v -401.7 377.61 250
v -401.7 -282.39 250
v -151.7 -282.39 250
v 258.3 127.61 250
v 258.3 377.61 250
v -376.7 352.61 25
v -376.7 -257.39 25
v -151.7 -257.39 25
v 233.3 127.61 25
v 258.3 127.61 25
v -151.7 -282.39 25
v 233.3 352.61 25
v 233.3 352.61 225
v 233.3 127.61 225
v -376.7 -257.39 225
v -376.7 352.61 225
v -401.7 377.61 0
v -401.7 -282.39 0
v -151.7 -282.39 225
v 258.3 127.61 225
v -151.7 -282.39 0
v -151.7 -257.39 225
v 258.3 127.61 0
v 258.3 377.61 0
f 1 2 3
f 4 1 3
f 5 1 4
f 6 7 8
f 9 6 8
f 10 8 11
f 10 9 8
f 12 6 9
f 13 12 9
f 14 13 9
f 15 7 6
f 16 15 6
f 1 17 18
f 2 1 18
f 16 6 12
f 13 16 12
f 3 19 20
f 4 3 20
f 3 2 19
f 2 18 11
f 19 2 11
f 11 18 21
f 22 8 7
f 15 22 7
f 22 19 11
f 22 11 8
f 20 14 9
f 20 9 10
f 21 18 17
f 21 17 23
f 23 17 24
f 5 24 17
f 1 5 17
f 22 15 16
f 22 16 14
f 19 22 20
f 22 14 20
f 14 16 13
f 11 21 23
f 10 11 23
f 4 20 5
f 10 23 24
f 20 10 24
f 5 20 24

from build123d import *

# Parameters (mm, degrees)
F1_DEPTH = 25
F3_DEPTH = 200
F5_DEPTH = 25


with BuildPart() as f1:
    # F0 (on Top) → F1 (new body)
    with BuildSketch(Plane.XY):
        Polygon((-401.6996773316, 377.6099345749), (-401.6996773316, -282.3900654251), (-151.6996773316, -282.3900654251), (258.3003226684, 127.6099345749), (258.3003226684, 377.6099345749), align=None)
    extrude(amount=F1_DEPTH)

    # F2 (on face) → F3 (join)
    with BuildSketch(Plane.XY.offset(25)):
        Polygon((-376.6996773316, -257.3900654251), (-376.6996773316, 352.6099345749), (233.3003226684, 352.6099345749), (233.3003226684, 127.6099345749), (258.3003226684, 127.6099345749), (258.3003226684, 377.6099345749), (-401.6996773316, 377.6099345749), (-401.6996773316, -282.3900654251), (-151.6996773316, -282.3900654251), (-151.6996773316, -257.3900654251), align=None)
    extrude(amount=F3_DEPTH)

    # F4 (on face) → F5 (join)
    with BuildSketch(Plane.XY.offset(225)):
        Polygon((-401.6996773316, -282.3900654251), (-151.6996773316, -282.3900654251), (-151.6996773316, -257.3900654251), (-376.6996773316, -257.3900654251), (-376.6996773316, 352.6099345749), (233.3003226684, 352.6099345749), (233.3003226684, 127.6099345749), (258.3003226684, 127.6099345749), (258.3003226684, 377.6099345749), (-401.6996773316, 377.6099345749), align=None)
        Polygon((-151.6996773316, -257.3900654251), (-151.6996773316, -282.3900654251), (258.3003226684, 127.6099345749), (233.3003226684, 127.6099345749), (233.3003226684, 352.6099345749), (-376.6996773316, 352.6099345749), (-376.6996773316, -257.3900654251), align=None)
    extrude(amount=F5_DEPTH)


solid = f1.part
